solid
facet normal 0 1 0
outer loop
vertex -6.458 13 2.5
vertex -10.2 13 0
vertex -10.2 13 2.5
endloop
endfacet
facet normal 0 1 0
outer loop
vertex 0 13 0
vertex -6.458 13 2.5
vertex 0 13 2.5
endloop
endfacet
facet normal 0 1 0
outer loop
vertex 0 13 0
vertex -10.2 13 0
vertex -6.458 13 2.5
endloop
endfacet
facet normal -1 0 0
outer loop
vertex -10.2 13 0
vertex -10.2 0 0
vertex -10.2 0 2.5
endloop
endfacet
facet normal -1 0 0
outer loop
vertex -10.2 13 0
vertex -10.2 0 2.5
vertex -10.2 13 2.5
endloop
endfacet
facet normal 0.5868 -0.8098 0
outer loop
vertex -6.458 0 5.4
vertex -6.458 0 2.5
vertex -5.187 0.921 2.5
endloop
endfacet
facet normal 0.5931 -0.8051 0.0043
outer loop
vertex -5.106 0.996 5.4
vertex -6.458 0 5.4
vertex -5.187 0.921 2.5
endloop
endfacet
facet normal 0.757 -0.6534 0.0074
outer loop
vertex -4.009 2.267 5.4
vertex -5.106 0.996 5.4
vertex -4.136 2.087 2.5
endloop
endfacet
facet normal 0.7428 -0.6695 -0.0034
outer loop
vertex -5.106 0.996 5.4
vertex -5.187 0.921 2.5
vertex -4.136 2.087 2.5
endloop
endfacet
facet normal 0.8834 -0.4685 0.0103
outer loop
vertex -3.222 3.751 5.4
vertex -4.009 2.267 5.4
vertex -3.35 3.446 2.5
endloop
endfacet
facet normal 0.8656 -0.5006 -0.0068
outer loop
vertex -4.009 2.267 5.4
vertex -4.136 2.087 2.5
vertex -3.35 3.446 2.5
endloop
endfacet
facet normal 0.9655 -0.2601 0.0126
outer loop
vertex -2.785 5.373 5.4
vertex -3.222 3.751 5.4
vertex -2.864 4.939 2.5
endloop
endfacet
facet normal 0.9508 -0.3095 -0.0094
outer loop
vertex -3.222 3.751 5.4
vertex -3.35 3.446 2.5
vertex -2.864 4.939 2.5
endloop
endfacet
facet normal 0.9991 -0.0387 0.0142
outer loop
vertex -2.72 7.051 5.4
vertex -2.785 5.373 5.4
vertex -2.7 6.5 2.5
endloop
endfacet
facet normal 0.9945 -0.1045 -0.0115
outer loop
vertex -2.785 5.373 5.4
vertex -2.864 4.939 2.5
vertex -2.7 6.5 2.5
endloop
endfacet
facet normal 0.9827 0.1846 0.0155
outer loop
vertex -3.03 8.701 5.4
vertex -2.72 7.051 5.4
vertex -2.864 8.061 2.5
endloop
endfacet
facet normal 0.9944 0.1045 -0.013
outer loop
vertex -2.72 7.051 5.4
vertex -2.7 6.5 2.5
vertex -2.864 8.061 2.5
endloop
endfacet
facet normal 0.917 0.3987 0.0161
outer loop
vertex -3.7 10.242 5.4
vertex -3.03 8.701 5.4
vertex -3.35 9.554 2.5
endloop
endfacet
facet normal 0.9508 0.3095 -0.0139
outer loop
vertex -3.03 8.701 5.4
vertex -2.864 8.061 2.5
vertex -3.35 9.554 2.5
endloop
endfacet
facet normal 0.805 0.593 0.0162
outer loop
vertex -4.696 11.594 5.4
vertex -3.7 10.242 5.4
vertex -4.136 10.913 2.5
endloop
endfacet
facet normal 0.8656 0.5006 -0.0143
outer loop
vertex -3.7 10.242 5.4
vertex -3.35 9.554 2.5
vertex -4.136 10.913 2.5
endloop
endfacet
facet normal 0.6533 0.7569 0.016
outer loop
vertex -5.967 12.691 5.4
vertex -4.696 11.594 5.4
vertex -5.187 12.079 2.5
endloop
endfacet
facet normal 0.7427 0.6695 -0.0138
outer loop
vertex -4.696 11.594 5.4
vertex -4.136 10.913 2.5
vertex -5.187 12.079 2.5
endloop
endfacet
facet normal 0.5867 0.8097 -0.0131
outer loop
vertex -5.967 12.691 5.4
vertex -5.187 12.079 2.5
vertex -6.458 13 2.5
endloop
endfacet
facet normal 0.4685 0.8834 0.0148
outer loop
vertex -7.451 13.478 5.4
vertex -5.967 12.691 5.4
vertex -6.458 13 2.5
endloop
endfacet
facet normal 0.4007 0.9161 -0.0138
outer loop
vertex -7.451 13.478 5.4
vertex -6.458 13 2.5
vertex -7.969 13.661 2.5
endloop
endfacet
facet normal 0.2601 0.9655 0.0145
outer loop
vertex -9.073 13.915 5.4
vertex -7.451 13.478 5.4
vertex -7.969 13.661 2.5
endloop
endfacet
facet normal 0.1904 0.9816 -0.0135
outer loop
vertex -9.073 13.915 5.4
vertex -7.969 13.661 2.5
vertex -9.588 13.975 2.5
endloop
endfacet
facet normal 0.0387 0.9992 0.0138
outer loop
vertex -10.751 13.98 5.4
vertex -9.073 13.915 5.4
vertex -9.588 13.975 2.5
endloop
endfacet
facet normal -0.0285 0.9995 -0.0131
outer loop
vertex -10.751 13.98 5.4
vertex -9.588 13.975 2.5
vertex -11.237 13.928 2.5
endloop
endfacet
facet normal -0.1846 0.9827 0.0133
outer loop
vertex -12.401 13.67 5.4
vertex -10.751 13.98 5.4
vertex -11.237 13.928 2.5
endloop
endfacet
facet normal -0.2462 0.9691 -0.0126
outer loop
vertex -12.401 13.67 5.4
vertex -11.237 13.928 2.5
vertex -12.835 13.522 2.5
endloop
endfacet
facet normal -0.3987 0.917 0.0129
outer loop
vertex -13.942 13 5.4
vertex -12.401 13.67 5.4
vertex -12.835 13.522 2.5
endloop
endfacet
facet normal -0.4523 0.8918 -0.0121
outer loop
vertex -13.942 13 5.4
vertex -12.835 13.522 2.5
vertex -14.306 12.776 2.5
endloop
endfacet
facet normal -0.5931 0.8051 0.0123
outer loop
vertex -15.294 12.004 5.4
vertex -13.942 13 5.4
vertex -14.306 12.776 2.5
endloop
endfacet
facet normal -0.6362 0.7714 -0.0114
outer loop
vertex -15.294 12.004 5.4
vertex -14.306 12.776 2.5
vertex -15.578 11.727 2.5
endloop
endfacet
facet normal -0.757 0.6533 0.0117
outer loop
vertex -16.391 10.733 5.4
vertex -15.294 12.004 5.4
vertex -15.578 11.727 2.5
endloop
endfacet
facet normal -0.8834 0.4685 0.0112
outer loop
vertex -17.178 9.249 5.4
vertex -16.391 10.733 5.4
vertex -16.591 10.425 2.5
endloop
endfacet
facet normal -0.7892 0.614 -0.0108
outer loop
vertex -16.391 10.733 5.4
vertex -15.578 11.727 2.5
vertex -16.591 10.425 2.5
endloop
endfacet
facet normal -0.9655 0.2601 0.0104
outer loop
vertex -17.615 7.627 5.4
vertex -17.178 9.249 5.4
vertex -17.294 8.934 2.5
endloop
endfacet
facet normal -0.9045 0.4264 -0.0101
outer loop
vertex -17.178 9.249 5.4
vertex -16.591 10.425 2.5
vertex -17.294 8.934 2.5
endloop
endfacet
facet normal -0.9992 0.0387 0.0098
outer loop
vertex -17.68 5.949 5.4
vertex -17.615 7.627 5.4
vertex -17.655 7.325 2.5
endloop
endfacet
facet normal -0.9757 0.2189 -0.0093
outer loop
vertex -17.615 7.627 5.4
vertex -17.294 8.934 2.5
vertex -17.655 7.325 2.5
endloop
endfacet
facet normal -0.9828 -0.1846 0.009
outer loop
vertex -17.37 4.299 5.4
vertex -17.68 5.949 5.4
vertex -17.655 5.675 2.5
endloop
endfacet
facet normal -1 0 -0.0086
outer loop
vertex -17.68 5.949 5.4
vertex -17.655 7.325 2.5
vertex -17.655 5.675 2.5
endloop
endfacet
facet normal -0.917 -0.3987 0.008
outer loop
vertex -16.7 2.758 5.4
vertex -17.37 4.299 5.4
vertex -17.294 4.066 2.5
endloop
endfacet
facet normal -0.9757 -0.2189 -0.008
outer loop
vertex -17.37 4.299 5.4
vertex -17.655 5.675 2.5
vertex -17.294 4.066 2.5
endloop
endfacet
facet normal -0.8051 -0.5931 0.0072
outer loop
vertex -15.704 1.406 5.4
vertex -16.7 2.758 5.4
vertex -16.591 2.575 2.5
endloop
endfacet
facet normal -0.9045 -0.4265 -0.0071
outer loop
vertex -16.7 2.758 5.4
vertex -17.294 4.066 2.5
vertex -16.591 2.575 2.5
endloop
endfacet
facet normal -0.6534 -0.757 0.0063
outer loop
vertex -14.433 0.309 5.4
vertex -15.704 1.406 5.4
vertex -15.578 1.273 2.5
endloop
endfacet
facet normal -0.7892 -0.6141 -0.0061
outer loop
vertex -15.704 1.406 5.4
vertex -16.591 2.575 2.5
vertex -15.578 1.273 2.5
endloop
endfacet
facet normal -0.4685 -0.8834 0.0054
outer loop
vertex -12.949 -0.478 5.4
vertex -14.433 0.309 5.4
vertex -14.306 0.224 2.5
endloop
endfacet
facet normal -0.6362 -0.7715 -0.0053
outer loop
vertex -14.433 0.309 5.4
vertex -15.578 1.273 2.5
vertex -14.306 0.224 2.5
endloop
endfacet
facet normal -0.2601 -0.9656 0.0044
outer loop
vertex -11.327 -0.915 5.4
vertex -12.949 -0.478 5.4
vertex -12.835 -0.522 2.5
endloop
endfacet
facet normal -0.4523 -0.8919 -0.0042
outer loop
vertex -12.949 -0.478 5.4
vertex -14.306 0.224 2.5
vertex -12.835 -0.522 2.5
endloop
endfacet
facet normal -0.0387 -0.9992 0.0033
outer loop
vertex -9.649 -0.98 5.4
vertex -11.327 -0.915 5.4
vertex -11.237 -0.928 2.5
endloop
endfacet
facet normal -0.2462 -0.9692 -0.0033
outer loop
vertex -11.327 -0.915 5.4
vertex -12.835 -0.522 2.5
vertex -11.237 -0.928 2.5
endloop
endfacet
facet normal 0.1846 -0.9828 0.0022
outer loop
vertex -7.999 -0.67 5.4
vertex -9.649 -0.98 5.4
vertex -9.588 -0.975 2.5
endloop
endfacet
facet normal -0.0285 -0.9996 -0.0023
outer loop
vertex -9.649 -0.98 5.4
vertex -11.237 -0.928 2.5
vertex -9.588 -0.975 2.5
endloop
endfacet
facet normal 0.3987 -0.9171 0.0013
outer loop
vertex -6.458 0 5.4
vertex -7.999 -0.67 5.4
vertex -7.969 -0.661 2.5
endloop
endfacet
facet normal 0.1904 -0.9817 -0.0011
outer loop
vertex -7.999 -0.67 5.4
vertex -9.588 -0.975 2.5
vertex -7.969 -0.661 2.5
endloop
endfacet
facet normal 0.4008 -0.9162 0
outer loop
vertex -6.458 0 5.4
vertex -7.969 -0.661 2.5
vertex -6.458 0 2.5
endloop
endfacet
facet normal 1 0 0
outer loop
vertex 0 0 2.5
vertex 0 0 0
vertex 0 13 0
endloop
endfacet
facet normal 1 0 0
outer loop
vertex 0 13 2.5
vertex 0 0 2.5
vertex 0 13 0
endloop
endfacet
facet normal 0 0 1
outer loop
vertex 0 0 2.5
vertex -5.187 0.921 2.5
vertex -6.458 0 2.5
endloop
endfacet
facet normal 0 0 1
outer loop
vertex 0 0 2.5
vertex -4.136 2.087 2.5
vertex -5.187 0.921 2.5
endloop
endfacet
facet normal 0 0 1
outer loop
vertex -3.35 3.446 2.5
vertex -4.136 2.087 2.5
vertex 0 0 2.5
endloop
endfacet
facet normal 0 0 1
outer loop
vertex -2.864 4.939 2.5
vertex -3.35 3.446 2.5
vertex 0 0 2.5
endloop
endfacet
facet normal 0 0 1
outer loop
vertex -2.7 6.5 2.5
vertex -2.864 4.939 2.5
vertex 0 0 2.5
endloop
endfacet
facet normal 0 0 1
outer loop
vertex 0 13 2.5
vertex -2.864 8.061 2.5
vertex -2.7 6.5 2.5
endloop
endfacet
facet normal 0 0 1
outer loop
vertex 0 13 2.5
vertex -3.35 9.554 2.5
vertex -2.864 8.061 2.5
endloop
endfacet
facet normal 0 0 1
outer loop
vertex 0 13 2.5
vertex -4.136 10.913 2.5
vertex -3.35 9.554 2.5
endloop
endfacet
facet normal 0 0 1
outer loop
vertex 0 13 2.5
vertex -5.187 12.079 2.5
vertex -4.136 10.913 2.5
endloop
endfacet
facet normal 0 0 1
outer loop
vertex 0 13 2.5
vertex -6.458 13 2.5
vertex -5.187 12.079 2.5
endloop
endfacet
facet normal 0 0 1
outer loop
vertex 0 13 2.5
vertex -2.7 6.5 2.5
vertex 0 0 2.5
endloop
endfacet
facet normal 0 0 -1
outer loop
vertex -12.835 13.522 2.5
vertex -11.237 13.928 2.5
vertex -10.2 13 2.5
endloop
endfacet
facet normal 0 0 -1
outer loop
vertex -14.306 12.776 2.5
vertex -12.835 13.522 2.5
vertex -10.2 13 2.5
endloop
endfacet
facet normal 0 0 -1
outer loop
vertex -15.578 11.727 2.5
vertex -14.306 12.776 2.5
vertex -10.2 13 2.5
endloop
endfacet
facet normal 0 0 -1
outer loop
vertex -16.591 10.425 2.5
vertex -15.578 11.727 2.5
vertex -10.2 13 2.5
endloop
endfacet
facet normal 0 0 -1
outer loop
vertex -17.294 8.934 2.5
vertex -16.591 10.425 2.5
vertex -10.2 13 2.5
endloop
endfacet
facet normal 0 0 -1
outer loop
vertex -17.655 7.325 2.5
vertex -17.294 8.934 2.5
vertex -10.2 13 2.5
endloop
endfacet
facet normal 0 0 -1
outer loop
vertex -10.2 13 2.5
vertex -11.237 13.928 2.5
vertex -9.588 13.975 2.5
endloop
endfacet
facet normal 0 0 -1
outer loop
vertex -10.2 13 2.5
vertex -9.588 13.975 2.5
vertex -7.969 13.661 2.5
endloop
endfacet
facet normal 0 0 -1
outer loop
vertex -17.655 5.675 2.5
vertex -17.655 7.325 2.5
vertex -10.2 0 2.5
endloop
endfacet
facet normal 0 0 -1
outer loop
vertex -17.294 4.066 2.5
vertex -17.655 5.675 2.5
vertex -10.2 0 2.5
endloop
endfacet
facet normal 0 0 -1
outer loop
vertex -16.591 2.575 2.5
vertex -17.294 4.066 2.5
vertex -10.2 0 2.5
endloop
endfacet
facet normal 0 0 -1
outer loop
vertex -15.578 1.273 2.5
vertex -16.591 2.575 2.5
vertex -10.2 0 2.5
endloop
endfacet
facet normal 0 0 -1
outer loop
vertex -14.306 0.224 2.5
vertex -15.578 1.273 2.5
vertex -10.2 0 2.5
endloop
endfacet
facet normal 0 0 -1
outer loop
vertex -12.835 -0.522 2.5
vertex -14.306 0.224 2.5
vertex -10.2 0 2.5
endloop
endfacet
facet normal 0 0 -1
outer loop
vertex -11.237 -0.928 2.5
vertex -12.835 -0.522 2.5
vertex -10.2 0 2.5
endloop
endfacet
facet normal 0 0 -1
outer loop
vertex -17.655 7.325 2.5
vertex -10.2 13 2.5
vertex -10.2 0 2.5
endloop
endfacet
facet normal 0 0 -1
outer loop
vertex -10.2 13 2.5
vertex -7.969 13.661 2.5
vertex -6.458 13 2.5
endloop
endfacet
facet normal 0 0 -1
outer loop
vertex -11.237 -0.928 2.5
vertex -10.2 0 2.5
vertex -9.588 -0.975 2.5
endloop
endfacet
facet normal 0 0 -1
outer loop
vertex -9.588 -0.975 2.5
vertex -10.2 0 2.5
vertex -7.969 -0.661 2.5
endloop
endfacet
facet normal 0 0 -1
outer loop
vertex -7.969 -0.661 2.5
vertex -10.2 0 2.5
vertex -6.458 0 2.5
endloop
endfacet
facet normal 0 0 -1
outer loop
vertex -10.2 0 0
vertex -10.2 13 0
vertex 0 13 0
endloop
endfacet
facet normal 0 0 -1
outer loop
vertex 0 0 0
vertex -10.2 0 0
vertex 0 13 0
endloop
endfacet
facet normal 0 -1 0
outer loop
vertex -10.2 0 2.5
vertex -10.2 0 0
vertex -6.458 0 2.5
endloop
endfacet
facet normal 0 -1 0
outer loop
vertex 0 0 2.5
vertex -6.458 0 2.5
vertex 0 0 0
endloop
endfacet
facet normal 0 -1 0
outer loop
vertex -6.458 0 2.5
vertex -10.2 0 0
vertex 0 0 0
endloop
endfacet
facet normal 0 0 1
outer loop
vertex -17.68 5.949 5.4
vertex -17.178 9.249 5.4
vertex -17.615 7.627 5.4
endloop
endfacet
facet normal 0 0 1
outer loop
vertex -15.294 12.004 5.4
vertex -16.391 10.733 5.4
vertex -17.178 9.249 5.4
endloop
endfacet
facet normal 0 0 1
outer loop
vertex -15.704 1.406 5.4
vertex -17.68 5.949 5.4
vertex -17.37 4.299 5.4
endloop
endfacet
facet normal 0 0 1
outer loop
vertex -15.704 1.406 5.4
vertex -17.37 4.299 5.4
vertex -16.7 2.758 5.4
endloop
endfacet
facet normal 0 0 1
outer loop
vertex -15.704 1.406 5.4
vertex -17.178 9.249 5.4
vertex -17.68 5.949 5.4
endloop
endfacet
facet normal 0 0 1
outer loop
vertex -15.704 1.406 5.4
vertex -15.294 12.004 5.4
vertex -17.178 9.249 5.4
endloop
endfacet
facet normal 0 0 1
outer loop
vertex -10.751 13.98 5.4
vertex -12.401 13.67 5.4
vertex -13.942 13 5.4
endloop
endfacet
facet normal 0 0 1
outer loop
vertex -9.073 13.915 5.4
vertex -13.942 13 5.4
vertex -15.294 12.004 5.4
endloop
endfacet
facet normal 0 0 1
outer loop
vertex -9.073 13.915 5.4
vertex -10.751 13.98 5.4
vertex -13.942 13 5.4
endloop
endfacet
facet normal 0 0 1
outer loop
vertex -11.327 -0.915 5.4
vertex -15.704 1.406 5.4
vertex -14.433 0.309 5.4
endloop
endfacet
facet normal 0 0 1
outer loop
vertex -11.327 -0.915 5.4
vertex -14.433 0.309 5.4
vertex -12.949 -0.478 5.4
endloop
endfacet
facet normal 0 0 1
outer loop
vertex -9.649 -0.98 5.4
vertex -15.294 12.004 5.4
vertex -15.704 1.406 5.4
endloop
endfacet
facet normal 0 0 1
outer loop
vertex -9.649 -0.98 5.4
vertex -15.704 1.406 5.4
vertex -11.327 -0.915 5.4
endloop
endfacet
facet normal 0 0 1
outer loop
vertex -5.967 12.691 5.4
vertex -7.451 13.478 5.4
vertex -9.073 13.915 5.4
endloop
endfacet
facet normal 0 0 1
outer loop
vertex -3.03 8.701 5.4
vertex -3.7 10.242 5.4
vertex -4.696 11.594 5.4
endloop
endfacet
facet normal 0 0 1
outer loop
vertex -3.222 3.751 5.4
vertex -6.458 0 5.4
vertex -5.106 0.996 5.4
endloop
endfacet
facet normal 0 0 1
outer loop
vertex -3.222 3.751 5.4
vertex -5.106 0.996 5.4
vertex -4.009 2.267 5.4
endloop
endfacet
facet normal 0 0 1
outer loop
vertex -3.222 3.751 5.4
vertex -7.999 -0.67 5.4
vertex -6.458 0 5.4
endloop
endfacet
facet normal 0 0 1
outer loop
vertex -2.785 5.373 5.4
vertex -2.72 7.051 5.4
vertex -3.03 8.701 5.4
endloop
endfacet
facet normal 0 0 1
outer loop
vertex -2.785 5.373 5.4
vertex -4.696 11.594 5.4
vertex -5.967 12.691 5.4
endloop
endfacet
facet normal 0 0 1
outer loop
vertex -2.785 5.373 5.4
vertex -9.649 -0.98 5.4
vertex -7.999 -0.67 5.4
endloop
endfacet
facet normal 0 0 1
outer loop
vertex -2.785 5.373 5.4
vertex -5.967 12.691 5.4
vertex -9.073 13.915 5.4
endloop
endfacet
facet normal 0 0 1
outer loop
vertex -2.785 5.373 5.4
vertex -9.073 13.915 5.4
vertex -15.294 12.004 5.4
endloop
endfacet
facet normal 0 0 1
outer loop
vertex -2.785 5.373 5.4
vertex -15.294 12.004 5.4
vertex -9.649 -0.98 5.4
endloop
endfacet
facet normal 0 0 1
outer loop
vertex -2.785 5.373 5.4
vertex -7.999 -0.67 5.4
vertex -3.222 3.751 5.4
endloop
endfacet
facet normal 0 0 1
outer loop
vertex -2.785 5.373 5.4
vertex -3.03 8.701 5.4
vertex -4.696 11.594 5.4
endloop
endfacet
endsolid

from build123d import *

# Parameters (mm, degrees)
SKETCH_1_W      = 10.2
SKETCH_1_H      = 13
EXTRUDE_1_DEPTH = 2.5
SKETCH_2_R      = 7.5
EXTRUDE_2_DEPTH = 2.9


with BuildPart() as part:
    # 草图1 → 凸台-拉伸1 (new body)
    with BuildSketch(Plane.XY):
        with Locations((-5.1, 6.5)):
            Rectangle(SKETCH_1_W, SKETCH_1_H)
    extrude(amount=EXTRUDE_1_DEPTH)

    # 草图2 → 凸台-拉伸2 (add)
    with BuildSketch(Plane.XY.offset(2.5)):
        with Locations(Location((-10.2, 6.5, 0), (0, 0, 299.926434867))):
            Circle(SKETCH_2_R)
    extrude(amount=EXTRUDE_2_DEPTH)


solid = part.part
